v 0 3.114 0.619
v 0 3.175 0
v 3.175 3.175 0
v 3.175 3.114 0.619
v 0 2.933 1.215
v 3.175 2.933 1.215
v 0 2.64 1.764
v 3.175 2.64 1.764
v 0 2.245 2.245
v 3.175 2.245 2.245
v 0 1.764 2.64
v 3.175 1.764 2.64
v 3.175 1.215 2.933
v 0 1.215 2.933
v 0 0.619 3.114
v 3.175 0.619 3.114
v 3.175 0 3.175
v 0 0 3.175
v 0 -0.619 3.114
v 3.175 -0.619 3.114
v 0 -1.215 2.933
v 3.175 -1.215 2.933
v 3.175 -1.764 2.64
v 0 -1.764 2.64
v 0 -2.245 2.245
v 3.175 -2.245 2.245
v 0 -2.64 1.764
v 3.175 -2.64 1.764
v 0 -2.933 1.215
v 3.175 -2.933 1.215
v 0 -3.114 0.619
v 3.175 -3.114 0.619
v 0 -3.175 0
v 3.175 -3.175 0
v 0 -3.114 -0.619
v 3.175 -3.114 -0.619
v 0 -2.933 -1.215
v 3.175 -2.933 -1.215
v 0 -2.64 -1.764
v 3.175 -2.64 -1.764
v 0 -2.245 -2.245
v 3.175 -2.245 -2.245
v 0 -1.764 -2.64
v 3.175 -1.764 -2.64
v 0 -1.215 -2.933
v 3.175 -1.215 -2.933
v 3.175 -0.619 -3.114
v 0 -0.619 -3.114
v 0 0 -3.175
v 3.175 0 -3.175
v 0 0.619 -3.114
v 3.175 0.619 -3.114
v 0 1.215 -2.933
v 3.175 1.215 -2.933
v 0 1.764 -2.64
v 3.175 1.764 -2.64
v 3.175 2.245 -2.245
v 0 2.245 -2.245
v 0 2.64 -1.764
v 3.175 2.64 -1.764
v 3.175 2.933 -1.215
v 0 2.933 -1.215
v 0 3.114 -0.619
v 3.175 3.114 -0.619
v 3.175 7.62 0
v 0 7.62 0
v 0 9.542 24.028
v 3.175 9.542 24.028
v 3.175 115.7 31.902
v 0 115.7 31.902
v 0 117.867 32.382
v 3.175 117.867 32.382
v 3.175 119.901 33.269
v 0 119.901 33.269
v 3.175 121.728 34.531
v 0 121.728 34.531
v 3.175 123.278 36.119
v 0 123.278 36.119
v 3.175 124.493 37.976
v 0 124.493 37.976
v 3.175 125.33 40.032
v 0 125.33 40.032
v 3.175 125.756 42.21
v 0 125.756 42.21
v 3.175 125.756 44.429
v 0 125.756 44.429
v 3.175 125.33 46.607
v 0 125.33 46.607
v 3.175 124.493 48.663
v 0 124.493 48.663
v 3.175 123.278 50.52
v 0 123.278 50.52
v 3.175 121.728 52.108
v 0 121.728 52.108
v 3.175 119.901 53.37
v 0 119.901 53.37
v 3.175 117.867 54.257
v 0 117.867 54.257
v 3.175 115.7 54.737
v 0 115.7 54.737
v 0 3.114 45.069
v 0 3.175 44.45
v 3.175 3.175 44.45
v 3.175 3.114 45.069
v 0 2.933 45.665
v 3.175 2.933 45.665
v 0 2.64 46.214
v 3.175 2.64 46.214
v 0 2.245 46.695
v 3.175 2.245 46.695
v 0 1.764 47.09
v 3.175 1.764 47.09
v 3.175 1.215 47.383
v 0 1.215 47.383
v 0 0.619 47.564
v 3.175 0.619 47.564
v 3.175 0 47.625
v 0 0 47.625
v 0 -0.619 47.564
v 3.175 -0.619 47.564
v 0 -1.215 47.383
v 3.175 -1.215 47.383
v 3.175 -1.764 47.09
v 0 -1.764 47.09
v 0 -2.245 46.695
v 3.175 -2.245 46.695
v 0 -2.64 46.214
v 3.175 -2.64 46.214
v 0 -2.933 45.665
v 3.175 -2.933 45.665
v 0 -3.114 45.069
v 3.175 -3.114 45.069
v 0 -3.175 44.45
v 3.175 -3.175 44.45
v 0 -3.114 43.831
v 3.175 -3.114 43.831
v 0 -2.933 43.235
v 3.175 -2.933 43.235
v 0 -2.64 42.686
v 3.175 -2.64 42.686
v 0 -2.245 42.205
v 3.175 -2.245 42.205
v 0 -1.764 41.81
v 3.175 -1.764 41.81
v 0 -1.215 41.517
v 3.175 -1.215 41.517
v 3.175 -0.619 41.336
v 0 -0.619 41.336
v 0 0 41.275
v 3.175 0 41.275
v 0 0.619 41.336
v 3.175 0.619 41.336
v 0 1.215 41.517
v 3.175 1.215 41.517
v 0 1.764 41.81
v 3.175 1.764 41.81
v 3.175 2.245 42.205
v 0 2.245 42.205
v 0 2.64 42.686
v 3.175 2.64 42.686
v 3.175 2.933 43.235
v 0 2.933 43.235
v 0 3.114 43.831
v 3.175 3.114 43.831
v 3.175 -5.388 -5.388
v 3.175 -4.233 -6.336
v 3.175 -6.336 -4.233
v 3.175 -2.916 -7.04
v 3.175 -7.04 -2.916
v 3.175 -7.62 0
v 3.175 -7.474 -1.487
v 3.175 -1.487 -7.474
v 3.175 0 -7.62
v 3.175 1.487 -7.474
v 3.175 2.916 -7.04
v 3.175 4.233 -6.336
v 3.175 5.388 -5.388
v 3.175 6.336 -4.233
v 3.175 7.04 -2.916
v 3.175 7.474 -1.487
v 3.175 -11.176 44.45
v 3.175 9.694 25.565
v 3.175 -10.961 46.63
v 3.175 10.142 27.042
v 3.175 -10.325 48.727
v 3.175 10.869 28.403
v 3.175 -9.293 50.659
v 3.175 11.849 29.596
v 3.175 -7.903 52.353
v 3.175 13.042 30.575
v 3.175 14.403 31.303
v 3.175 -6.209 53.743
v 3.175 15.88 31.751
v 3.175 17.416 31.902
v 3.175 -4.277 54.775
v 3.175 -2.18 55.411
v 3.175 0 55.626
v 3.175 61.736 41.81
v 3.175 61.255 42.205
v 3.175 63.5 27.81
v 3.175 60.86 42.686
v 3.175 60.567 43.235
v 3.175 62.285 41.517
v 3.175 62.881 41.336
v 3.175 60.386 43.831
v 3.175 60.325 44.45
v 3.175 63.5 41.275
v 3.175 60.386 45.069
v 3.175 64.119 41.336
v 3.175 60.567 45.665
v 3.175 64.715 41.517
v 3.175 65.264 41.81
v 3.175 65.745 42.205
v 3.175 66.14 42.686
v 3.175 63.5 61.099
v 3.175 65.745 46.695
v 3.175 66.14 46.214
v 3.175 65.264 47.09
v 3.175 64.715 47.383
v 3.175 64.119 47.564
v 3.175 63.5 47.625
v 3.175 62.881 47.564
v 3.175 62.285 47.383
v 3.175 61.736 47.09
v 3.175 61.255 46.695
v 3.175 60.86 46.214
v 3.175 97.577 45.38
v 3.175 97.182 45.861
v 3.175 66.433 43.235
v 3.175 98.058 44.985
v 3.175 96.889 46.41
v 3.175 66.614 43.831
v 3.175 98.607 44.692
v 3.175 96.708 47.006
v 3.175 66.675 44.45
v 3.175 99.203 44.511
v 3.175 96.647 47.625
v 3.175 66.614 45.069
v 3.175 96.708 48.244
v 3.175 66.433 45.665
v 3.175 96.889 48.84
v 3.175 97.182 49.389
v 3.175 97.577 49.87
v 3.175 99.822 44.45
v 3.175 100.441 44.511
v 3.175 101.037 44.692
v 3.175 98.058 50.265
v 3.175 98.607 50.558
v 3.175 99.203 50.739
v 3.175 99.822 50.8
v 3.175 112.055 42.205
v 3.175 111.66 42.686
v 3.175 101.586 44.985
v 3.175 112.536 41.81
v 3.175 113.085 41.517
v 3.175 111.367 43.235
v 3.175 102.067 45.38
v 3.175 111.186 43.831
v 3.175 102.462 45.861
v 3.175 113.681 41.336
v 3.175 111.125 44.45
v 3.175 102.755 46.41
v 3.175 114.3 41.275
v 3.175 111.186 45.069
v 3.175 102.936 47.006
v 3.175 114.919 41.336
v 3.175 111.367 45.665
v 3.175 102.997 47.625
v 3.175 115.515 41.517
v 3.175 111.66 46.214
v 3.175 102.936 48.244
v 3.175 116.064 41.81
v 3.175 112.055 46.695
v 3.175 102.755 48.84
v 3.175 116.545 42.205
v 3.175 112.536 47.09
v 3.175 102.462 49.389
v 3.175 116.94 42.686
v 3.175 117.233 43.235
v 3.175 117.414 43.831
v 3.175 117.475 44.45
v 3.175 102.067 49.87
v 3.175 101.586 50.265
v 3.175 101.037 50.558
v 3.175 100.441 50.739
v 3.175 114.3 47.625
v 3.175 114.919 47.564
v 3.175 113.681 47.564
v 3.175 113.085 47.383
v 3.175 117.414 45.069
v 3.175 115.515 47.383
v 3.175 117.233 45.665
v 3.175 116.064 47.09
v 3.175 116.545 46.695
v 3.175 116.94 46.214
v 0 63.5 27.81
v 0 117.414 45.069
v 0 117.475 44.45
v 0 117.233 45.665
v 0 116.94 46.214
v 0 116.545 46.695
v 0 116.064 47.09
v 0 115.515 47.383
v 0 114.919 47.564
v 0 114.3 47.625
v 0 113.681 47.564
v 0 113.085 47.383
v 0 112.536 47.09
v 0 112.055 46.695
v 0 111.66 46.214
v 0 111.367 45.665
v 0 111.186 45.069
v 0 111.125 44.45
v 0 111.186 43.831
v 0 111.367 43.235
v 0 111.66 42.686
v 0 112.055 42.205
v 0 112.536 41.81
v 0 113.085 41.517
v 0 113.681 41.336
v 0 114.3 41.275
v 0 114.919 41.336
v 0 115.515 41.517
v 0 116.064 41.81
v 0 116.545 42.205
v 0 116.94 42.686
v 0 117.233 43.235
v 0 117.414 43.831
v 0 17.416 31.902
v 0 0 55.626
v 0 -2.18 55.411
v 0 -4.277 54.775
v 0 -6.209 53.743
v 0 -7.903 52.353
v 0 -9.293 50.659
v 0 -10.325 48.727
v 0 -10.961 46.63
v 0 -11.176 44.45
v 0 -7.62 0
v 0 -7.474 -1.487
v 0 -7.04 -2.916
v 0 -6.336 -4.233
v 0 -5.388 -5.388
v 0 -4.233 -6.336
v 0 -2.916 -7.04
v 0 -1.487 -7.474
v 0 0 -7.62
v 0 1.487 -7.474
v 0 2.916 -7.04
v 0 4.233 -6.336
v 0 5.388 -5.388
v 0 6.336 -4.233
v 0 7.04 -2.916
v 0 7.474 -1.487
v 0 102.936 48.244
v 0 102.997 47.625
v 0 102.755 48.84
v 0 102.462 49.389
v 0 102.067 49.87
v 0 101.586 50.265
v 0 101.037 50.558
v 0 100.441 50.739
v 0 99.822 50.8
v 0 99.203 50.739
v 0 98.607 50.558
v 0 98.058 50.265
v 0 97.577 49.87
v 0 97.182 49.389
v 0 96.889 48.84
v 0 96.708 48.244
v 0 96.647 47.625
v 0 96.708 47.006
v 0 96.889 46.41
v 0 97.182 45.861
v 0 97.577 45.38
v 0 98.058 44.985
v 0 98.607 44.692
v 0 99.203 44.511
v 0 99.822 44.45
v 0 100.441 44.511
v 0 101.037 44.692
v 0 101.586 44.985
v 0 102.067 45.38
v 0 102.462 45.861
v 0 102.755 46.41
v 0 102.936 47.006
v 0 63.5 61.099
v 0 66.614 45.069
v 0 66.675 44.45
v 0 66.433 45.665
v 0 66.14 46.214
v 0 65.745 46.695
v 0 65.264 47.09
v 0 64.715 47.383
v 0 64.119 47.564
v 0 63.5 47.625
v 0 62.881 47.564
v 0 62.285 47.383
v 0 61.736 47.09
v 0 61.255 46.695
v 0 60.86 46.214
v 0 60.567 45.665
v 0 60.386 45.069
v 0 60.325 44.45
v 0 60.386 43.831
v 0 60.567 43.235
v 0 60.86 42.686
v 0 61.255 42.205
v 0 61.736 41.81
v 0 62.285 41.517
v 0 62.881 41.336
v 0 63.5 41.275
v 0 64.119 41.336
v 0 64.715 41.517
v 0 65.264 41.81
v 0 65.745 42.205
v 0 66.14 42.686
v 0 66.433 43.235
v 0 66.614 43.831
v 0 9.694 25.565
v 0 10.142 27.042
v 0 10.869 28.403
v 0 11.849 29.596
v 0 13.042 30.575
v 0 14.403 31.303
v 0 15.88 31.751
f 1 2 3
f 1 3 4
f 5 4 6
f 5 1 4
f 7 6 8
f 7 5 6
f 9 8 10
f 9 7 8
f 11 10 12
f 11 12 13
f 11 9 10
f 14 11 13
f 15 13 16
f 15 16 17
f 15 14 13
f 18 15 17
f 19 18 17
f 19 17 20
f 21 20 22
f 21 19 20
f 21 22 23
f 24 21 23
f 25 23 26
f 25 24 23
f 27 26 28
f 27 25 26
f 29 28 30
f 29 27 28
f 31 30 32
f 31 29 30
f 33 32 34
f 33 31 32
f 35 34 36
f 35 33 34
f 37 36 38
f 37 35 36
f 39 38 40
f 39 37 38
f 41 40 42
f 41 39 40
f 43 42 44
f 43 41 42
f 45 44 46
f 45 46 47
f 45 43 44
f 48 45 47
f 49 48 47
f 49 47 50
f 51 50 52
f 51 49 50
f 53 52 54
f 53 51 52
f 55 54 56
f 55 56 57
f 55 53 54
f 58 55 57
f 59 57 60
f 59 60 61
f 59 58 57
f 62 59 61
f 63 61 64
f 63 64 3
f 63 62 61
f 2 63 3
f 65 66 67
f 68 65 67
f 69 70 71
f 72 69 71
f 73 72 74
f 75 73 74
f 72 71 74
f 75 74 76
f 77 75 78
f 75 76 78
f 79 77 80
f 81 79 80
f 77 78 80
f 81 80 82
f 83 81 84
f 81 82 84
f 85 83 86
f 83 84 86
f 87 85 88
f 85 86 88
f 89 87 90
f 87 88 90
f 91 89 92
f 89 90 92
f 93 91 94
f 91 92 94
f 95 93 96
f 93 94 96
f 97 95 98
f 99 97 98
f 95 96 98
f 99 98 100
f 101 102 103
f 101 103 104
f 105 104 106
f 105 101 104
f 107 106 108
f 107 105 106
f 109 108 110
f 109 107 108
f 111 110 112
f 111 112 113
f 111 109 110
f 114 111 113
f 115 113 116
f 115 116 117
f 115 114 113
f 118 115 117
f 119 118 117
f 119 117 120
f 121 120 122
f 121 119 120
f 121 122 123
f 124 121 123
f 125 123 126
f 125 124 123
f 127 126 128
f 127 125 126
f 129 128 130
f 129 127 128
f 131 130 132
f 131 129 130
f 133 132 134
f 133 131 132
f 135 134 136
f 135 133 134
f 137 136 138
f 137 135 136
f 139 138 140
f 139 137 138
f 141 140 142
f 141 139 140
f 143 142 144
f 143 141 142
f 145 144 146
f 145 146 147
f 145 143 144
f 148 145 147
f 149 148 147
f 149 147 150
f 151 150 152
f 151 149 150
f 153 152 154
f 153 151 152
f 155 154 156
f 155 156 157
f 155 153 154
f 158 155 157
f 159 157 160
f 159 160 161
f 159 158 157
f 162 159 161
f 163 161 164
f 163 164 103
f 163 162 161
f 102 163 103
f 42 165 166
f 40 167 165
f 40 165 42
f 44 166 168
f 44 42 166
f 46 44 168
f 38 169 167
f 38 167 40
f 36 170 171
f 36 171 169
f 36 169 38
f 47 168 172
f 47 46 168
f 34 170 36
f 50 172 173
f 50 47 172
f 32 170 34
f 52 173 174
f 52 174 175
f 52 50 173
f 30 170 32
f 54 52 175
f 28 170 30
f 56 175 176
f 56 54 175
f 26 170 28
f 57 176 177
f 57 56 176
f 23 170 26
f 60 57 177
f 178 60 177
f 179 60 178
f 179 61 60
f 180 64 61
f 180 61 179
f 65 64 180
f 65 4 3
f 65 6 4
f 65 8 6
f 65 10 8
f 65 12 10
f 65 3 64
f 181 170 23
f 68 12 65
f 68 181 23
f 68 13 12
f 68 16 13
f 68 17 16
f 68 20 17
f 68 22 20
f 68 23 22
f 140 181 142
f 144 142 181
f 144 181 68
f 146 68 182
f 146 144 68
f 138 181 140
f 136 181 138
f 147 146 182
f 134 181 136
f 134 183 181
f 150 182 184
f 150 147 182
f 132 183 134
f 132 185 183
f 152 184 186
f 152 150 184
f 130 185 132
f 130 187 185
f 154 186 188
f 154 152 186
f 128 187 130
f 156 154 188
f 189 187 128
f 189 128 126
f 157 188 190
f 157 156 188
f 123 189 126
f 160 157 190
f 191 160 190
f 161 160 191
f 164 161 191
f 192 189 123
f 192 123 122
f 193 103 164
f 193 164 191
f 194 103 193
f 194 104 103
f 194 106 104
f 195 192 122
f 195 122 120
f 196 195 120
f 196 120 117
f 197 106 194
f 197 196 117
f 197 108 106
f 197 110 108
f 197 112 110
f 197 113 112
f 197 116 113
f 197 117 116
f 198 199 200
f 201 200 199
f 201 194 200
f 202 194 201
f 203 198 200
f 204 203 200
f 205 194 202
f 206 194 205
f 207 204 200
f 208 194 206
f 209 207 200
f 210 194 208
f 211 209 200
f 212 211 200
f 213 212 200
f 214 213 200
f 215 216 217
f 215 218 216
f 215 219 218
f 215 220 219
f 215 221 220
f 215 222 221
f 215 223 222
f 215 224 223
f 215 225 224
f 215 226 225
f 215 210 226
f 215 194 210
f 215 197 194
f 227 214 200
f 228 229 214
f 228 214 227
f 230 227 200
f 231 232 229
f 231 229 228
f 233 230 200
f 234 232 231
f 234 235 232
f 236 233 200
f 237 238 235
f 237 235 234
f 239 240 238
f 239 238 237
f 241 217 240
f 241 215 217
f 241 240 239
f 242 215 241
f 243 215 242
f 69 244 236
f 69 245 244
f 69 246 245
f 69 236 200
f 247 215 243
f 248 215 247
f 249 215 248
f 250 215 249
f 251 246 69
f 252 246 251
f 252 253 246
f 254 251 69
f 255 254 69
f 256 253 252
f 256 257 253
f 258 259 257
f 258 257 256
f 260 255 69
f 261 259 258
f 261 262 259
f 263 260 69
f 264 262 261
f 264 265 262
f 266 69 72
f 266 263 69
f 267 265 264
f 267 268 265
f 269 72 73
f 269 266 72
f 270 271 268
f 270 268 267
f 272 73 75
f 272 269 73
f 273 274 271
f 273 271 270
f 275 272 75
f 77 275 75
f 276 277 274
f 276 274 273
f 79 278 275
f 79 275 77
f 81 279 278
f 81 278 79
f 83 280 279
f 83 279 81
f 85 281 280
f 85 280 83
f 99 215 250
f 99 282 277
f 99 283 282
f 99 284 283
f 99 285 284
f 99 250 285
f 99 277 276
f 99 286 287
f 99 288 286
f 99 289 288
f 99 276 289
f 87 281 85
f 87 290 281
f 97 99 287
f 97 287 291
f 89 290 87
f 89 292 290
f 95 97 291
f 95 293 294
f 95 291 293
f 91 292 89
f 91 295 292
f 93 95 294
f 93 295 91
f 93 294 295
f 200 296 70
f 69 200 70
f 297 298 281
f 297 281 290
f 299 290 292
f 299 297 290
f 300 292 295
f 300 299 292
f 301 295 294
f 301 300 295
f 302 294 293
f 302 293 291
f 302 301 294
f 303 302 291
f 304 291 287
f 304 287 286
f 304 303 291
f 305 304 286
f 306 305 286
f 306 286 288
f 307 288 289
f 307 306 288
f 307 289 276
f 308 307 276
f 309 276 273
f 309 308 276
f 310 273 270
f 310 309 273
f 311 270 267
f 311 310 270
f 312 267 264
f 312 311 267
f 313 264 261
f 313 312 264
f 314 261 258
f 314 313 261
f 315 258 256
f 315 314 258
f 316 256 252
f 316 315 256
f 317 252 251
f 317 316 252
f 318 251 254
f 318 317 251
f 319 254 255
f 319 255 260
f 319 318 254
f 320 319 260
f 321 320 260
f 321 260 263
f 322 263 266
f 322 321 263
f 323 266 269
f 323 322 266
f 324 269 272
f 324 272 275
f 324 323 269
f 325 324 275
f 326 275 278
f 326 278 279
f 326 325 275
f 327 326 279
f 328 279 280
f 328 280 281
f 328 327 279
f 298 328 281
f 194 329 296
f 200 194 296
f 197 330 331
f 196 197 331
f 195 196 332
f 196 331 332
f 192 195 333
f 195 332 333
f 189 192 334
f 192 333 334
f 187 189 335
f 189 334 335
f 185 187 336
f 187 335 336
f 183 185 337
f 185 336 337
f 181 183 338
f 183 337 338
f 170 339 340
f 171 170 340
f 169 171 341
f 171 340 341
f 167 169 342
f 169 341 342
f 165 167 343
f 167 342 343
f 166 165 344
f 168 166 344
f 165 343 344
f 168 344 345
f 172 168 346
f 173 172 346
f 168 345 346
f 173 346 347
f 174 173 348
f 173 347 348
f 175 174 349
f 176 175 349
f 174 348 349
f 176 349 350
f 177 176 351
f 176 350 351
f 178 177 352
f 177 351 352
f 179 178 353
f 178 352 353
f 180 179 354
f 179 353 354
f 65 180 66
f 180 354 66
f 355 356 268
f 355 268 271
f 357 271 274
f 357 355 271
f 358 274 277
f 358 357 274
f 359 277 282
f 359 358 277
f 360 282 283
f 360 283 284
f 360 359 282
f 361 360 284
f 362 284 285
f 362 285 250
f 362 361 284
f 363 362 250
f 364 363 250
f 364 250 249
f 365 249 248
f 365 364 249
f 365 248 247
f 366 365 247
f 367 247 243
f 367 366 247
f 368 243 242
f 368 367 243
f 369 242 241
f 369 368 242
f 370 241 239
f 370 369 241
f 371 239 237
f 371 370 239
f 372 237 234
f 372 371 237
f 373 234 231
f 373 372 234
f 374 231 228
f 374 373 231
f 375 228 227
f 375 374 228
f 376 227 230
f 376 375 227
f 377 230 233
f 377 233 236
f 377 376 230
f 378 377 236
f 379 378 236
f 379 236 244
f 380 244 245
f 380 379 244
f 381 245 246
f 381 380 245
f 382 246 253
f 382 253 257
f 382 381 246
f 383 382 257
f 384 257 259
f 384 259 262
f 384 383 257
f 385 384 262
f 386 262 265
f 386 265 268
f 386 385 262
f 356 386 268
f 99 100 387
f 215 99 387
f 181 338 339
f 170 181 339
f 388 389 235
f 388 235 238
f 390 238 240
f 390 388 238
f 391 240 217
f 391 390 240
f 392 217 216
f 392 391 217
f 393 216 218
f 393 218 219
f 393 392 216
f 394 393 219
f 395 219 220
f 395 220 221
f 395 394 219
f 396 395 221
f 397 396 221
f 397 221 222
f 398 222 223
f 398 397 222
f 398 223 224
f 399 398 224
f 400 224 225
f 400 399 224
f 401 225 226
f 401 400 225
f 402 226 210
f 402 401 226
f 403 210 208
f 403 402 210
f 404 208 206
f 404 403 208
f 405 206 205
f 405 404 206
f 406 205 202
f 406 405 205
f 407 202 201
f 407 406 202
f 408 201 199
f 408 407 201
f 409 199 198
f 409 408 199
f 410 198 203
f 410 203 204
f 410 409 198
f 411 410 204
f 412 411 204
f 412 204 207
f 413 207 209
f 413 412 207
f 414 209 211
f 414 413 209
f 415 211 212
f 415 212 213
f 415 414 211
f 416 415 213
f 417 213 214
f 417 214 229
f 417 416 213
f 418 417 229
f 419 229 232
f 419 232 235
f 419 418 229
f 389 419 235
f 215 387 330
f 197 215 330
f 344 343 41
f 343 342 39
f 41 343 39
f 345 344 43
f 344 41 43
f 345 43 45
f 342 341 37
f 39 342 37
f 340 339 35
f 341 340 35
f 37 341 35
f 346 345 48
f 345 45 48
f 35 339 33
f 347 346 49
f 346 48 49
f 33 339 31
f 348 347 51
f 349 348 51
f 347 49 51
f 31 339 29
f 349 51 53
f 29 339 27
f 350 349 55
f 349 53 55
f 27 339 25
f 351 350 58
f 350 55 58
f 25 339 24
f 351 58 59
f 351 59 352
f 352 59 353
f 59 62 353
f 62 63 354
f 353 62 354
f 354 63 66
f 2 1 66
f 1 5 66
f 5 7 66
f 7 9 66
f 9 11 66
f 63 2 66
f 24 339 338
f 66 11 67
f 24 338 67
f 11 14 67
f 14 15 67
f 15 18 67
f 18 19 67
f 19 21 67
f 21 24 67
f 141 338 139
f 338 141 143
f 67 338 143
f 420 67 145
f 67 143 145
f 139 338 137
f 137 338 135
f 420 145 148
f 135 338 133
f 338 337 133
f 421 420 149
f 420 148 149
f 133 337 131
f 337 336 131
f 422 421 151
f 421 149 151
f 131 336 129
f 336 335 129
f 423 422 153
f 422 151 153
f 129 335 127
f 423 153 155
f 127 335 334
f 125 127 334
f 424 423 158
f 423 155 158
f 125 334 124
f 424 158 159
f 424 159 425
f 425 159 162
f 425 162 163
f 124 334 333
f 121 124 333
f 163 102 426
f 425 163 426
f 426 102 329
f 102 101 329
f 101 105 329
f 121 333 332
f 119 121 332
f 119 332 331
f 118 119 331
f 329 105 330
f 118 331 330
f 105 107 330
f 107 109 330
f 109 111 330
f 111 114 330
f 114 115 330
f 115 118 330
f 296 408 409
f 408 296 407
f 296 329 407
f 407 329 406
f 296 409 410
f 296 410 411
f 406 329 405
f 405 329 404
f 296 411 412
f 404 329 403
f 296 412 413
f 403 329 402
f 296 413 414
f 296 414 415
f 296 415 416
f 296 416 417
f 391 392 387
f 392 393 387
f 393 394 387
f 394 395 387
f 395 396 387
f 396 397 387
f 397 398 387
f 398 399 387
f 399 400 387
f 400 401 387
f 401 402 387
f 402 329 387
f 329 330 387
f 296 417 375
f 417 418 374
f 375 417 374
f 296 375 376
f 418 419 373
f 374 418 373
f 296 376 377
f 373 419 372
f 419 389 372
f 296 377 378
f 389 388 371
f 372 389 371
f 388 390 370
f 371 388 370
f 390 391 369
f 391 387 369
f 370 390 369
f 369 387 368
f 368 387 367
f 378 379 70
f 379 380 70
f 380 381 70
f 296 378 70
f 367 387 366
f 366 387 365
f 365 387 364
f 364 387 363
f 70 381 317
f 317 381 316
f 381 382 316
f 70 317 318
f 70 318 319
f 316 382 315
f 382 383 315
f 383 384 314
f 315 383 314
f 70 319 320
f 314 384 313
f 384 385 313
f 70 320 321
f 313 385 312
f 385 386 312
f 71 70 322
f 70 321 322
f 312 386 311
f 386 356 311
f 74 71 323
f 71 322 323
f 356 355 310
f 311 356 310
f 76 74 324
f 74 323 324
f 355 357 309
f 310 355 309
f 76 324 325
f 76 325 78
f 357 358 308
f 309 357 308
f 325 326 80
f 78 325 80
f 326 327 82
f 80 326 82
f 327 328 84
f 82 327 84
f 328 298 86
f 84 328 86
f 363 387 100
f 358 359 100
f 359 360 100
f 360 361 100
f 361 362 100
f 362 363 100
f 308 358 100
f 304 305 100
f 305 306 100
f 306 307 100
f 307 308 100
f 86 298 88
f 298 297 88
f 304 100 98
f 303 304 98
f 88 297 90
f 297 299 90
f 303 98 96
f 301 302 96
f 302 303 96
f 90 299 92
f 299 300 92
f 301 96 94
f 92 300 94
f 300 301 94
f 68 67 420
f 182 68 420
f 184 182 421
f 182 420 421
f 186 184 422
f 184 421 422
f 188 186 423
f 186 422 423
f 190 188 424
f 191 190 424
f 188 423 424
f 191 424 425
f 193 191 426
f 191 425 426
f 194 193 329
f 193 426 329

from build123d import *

# Parameters (mm, degrees)
F0_R     = 3.175
F1_DEPTH = 3.175


with BuildPart() as f1:
    # F0 (on Right) → F1 (new body)
    with BuildSketch(Plane.YZ):
        with BuildLine():
            Line((-11.176, 44.45), (-7.62, 0))
            ThreePointArc((-7.62, 0), (0, -7.62), (7.62, 0))
            Line((7.62, 0), (9.542272, 24.0284))
            ThreePointArc((9.542272, 24.0284), (11.848513, 29.596159), (17.416272, 31.9024))
            Line((17.416272, 31.9024), (63.5, 27.810218))
            Line((63.5, 27.810218), (115.700079, 31.9024))
            ThreePointArc((115.700079, 31.9024), (125.810106, 43.319551), (115.700079, 54.736701))
            Line((115.700079, 54.736701), (63.5, 61.099302))
            Line((63.5, 61.099302), (0, 55.626))
            ThreePointArc((0, 55.626), (-7.902625, 52.352625), (-11.176, 44.45))
        make_face()
        Circle(F0_R, mode=Mode.SUBTRACT)
        with Locations((0, 44.45)):
            Circle(F0_R, mode=Mode.SUBTRACT)
        with Locations((63.5, 44.45)):
            Circle(F0_R, mode=Mode.SUBTRACT)
        with Locations((99.822, 47.625)):
            Circle(F0_R, mode=Mode.SUBTRACT)
        with Locations((114.3, 44.45)):
            Circle(F0_R, mode=Mode.SUBTRACT)
    extrude(amount=F1_DEPTH)


solid = f1.part
